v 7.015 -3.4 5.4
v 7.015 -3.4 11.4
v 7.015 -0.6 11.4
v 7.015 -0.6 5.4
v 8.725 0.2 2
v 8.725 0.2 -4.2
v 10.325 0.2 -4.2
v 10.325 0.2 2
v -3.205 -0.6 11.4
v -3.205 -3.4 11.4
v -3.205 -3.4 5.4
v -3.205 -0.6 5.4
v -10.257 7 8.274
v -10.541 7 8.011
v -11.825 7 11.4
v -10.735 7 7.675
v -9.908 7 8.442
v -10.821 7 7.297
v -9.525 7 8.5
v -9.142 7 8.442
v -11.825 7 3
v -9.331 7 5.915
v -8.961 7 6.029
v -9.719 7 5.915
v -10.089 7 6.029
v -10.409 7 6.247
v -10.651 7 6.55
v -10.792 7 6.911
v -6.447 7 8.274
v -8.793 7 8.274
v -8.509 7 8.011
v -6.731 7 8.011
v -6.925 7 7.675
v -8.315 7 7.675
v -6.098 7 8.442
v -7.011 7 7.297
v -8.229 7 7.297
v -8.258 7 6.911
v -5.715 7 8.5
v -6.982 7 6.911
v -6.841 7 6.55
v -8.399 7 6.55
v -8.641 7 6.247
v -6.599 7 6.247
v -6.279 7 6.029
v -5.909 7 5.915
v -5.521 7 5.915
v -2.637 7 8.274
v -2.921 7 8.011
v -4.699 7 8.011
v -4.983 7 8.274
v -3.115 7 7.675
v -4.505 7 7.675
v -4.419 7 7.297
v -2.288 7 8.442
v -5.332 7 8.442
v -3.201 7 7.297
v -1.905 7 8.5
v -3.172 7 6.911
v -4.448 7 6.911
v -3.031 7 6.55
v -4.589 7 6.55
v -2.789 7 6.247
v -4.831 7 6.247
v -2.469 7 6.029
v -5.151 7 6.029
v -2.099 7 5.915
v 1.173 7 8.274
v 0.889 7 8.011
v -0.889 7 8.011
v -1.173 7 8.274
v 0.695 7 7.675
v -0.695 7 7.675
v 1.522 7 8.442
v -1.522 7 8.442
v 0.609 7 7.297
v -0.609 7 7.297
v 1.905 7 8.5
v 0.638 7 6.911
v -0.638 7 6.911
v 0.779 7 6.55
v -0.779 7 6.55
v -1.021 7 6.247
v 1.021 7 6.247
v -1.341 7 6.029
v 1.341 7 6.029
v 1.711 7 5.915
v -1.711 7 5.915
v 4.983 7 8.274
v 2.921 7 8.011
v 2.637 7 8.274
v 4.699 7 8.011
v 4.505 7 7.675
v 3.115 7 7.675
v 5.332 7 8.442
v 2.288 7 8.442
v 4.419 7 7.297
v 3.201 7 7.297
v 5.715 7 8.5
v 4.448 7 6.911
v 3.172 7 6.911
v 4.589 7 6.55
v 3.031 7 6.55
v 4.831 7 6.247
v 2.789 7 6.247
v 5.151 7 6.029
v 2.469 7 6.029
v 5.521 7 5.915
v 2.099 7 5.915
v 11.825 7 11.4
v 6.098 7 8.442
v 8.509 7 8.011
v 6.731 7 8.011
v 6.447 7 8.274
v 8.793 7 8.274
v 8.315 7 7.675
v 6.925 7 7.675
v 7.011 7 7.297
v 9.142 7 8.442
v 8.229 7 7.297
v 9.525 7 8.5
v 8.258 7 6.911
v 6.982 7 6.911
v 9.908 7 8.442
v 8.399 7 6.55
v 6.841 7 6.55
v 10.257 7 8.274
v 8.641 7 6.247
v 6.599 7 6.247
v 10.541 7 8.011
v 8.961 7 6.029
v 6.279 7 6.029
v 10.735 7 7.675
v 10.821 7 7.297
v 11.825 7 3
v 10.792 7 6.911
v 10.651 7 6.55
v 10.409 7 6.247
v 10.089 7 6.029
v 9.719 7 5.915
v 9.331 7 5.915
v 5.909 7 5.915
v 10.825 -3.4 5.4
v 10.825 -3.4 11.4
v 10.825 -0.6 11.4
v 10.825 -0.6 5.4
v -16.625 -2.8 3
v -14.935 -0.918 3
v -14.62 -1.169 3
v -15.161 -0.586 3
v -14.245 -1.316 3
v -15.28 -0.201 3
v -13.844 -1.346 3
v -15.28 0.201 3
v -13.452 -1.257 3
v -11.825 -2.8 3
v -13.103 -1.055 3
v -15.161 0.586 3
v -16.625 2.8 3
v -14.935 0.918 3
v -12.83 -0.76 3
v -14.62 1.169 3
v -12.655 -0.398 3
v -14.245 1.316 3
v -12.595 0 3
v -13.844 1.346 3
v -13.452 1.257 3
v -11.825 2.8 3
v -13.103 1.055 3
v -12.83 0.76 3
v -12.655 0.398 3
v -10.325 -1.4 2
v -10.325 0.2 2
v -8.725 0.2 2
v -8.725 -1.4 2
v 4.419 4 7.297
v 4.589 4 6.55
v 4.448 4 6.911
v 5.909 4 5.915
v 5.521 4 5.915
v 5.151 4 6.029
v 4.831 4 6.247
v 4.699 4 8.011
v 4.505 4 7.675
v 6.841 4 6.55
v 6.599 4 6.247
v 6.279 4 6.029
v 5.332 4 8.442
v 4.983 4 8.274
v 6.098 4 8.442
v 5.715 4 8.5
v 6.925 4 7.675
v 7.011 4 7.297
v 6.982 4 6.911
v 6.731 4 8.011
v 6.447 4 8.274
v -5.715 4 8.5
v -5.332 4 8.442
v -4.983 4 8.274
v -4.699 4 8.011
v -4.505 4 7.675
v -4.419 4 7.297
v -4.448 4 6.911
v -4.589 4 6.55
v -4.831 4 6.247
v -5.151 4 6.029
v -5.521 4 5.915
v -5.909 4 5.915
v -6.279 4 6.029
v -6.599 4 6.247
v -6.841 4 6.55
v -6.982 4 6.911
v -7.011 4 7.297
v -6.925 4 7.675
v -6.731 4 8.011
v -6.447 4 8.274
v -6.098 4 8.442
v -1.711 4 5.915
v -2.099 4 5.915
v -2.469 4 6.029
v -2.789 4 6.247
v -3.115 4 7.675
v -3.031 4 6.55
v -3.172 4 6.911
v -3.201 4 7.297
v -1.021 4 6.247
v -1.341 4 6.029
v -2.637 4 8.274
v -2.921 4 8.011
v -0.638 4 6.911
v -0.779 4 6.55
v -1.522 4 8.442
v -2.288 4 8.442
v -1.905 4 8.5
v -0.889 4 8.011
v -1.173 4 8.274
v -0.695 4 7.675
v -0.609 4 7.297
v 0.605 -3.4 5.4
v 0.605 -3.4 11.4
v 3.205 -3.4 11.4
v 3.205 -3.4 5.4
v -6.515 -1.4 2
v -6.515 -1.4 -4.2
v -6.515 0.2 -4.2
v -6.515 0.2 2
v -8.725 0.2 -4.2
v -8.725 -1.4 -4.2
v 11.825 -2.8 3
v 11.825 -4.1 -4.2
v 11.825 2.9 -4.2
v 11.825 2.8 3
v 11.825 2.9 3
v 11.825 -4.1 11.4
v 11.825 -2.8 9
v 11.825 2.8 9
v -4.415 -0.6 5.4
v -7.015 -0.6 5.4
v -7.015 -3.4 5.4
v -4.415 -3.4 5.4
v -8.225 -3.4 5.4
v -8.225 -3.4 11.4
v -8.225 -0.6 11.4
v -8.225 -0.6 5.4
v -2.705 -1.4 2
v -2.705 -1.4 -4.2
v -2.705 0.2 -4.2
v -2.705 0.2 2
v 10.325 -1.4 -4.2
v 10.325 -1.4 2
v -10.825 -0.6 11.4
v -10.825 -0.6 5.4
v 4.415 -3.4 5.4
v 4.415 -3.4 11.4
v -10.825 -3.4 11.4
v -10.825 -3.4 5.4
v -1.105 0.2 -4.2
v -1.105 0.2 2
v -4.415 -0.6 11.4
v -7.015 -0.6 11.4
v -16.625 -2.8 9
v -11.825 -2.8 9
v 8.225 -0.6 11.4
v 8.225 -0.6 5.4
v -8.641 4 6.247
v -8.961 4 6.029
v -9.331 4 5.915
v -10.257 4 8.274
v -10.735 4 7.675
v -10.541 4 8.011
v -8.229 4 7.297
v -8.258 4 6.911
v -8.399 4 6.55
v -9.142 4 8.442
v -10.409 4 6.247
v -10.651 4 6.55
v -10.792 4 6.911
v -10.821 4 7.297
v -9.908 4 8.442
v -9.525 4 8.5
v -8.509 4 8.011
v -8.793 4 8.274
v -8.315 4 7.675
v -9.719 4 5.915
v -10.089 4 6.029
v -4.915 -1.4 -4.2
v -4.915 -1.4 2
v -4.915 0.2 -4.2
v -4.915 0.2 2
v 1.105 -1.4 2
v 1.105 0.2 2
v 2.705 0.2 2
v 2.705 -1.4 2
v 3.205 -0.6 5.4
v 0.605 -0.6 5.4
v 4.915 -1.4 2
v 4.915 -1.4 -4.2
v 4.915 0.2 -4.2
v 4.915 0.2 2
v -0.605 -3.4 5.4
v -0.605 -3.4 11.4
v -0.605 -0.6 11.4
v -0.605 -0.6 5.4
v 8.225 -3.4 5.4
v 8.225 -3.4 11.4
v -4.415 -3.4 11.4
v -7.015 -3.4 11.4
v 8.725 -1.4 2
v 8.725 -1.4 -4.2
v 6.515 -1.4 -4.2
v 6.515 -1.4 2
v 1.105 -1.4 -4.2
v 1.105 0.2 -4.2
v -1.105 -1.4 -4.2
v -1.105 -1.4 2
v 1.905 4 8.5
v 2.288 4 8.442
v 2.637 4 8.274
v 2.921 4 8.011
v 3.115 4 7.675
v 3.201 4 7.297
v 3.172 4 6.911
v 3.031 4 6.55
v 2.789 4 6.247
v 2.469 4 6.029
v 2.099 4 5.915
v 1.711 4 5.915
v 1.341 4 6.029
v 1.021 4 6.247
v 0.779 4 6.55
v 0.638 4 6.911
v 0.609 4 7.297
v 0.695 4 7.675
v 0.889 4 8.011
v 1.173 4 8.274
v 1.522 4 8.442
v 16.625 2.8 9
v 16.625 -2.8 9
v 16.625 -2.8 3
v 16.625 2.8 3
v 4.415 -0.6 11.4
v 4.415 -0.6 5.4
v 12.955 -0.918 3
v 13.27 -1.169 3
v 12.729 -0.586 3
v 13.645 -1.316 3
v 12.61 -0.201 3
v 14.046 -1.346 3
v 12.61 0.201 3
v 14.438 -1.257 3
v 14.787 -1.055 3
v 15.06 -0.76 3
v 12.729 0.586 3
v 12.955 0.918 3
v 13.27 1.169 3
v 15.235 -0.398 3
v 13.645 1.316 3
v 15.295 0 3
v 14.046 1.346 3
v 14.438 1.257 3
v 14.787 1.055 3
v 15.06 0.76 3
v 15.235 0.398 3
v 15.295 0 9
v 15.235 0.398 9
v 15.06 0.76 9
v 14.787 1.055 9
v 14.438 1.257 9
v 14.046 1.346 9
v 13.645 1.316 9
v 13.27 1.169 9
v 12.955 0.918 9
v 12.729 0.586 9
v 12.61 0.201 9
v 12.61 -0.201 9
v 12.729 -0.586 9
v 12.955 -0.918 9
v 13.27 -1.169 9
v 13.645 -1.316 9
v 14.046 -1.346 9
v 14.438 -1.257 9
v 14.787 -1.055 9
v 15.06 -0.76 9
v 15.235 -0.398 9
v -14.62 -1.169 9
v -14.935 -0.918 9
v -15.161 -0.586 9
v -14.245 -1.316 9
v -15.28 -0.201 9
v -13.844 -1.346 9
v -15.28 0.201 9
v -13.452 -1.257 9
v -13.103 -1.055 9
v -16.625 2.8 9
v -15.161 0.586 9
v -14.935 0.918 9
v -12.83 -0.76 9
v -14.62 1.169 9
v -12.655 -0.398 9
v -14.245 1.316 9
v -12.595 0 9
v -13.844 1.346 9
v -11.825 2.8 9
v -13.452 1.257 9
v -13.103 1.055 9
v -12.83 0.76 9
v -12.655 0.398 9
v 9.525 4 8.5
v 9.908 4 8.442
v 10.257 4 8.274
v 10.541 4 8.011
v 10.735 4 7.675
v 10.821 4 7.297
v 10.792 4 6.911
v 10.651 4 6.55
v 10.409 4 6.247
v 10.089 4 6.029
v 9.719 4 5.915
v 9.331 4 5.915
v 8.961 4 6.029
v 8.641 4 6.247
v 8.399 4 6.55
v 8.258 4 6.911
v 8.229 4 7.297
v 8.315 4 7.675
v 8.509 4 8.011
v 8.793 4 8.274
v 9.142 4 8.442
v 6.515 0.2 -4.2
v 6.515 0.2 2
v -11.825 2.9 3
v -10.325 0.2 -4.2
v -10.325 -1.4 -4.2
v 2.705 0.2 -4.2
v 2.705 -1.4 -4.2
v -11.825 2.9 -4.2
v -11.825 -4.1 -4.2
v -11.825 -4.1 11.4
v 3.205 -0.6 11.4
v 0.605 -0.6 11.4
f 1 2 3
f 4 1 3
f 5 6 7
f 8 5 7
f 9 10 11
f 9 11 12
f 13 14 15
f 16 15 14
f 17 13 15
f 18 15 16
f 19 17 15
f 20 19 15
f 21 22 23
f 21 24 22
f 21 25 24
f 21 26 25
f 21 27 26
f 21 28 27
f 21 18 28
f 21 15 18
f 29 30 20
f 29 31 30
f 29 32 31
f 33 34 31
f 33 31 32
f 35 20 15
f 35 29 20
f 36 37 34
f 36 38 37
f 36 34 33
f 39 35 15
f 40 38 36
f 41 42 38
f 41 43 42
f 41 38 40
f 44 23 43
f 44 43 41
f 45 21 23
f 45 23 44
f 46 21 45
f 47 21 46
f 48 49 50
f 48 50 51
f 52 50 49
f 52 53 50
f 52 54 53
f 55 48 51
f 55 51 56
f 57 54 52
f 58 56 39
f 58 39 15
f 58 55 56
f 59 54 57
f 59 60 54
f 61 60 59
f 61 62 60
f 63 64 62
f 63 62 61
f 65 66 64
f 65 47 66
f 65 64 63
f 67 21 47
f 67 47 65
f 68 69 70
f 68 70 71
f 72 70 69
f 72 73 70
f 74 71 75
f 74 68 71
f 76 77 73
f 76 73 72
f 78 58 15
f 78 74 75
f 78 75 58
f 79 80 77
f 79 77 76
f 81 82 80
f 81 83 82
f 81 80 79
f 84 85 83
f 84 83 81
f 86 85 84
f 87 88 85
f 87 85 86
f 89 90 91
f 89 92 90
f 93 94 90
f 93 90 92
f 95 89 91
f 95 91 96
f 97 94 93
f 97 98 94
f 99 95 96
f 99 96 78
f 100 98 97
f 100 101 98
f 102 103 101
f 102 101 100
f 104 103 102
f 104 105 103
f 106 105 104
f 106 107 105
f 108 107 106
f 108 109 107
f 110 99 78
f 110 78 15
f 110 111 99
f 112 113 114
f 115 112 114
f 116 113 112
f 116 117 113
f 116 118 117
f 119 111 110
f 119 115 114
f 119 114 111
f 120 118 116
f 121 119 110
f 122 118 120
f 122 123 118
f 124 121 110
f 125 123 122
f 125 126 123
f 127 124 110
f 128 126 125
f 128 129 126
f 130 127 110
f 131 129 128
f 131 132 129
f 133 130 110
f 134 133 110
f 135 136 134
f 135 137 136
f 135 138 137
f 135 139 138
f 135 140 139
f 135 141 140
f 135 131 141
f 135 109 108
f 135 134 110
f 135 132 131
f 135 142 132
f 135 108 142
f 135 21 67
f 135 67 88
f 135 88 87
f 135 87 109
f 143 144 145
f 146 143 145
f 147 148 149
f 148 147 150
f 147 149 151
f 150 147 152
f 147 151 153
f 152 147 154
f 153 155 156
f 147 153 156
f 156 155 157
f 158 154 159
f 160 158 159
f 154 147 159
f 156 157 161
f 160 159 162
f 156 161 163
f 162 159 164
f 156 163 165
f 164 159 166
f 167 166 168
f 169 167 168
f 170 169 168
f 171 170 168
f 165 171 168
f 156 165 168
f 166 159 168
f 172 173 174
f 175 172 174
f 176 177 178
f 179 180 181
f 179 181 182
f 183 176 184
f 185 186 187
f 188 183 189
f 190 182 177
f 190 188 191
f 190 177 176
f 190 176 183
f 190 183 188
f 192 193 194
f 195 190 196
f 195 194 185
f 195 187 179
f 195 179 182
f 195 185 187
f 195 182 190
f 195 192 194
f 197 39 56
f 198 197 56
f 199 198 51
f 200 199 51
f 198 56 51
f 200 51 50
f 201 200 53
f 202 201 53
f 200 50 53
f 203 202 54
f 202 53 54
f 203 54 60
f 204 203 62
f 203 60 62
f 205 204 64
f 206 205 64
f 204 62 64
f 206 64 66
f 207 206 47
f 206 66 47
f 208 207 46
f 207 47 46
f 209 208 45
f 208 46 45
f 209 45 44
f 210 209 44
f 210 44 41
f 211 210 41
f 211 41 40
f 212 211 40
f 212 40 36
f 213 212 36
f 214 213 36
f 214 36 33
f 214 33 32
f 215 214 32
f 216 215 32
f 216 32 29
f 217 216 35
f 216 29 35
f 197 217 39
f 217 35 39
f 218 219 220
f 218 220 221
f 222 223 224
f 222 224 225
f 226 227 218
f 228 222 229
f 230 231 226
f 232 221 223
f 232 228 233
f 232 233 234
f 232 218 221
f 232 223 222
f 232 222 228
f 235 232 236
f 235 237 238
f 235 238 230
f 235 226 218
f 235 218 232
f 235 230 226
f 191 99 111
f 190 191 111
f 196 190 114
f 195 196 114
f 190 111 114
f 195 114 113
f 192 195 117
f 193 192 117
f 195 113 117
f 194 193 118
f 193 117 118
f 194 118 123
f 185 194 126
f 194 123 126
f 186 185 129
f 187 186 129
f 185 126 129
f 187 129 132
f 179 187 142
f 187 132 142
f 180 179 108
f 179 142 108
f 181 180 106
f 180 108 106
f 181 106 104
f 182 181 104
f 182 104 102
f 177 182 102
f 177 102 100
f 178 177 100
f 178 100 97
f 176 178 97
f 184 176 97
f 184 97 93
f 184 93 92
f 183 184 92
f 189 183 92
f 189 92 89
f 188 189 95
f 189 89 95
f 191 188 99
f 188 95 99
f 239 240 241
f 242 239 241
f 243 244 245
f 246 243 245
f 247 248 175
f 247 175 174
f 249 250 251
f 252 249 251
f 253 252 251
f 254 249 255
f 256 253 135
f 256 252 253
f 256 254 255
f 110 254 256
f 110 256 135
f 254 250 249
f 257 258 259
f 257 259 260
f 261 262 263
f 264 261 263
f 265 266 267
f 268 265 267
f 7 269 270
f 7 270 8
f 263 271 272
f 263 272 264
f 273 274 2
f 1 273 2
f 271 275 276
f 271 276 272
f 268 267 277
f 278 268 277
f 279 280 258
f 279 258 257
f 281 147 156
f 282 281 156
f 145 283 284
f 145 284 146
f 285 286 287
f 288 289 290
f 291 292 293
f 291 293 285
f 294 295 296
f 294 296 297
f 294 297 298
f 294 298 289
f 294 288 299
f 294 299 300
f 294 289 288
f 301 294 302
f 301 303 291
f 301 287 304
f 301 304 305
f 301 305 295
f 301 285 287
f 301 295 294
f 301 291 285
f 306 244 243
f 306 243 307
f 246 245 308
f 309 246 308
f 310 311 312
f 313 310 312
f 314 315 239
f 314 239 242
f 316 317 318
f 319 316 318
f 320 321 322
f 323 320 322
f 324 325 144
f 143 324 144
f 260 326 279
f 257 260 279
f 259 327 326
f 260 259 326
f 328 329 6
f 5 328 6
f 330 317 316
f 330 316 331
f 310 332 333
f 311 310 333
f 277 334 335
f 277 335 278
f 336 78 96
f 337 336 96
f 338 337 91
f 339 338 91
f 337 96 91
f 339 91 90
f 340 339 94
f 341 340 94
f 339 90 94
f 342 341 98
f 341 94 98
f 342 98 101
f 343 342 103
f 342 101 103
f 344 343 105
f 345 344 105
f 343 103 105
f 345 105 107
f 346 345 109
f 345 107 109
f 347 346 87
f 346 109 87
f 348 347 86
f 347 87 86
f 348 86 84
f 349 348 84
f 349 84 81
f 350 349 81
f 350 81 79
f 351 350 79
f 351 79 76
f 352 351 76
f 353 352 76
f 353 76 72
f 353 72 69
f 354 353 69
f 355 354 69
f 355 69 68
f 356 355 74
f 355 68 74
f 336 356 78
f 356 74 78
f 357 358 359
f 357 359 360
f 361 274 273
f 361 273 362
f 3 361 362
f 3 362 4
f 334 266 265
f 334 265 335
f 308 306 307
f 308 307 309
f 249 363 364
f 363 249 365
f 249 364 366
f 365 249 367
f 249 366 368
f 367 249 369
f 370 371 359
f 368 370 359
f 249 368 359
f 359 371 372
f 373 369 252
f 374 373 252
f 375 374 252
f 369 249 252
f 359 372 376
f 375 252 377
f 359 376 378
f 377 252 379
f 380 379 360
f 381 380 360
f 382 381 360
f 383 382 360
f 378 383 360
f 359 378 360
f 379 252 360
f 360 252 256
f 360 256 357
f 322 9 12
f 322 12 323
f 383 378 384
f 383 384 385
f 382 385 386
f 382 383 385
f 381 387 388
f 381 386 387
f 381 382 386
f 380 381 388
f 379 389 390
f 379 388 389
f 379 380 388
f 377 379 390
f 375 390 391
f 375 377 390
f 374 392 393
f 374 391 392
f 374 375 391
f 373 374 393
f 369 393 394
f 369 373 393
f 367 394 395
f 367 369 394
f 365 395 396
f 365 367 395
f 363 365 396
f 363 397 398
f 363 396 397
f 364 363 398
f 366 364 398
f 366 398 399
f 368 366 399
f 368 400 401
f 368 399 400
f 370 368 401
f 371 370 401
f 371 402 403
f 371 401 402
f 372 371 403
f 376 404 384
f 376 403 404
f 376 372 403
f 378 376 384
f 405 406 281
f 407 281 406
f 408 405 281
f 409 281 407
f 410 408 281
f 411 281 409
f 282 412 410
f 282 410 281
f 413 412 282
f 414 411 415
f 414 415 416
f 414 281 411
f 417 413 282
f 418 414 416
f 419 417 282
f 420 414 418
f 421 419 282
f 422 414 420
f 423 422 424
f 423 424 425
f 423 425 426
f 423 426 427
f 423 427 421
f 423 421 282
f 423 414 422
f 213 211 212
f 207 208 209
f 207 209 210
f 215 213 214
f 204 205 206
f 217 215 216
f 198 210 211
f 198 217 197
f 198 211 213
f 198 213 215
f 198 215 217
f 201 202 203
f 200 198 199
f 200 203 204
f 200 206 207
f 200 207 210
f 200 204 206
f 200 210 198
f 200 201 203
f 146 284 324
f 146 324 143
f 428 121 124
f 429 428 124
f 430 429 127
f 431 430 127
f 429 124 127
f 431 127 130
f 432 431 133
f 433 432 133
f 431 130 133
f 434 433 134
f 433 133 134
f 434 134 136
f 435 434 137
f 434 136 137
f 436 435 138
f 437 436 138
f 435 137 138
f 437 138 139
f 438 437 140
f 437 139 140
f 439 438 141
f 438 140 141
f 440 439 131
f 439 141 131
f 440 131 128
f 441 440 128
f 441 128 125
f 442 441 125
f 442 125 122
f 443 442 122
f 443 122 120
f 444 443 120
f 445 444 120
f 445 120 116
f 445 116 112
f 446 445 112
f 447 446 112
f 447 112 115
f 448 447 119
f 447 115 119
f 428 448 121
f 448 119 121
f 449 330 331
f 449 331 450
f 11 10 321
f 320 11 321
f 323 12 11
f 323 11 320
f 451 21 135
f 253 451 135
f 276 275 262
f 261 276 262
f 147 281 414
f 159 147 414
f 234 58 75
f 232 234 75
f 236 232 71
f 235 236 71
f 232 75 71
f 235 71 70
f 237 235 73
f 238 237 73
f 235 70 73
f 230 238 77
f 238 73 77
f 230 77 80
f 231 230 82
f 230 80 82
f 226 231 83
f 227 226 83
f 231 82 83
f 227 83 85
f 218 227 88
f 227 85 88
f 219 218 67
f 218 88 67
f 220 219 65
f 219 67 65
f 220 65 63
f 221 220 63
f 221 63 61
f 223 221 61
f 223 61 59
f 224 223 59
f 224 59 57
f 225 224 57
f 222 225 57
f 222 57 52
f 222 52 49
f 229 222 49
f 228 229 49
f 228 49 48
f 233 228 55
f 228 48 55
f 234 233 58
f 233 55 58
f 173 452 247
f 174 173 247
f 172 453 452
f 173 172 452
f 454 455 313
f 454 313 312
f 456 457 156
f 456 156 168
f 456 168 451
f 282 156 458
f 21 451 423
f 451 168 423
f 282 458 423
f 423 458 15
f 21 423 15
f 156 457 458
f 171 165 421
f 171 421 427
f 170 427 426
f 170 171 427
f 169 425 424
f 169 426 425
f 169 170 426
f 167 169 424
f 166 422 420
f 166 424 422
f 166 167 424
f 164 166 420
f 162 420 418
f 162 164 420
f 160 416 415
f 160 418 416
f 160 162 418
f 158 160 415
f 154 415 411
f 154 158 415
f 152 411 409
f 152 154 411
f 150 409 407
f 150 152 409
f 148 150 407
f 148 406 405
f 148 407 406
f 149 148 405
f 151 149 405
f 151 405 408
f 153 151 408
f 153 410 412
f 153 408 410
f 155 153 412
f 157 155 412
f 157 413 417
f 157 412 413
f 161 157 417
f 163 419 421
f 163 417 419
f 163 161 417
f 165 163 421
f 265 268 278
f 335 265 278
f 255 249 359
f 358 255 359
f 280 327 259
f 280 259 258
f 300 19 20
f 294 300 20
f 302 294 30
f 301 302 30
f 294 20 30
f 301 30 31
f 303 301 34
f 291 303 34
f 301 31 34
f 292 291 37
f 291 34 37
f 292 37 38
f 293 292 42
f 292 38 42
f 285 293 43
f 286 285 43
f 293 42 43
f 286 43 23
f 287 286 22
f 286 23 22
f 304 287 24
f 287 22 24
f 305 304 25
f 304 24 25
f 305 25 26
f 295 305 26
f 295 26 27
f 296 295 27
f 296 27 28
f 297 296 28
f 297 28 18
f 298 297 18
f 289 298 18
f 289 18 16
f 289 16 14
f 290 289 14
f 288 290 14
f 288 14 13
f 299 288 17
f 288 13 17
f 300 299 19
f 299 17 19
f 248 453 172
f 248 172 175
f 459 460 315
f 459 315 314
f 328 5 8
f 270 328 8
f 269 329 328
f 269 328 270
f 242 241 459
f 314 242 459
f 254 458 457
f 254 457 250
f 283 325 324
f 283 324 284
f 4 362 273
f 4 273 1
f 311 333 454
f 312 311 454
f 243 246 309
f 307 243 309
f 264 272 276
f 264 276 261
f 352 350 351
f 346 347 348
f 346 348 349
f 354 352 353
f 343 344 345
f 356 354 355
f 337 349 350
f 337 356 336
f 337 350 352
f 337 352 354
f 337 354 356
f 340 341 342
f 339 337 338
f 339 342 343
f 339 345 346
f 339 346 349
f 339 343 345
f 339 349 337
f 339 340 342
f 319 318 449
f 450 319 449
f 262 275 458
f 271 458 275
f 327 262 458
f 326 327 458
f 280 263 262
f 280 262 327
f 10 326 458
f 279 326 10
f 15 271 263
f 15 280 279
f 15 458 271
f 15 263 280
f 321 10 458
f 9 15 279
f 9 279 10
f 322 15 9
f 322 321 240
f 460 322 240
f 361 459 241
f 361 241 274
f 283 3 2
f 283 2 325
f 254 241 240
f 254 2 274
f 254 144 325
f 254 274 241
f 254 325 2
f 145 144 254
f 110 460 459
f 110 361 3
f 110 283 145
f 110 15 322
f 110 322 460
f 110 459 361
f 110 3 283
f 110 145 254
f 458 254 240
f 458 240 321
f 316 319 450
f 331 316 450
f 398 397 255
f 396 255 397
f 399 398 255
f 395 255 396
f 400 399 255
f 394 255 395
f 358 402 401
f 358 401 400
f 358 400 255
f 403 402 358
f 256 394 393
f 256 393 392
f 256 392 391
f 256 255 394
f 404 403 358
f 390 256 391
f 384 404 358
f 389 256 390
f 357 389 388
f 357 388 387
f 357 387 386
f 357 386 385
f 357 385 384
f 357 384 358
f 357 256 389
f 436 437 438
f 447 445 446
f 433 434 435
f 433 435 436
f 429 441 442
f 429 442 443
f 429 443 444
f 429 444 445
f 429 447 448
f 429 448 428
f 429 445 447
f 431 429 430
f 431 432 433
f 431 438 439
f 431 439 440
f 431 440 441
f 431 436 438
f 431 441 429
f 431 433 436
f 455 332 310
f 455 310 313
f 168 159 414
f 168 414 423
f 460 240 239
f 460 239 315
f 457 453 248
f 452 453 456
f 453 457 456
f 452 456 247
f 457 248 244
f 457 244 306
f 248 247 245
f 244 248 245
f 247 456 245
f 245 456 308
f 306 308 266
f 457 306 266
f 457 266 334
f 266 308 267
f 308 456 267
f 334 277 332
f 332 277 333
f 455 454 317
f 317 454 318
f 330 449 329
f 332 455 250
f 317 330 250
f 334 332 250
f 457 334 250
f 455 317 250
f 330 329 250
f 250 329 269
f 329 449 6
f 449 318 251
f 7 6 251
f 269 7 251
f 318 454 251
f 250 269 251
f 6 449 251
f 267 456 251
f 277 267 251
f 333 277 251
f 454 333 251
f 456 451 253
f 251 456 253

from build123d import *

# Parameters (mm, degrees)
SK_BODY_W                     = 23.65
SK_BODY_H                     = 11.1
BODY_DEPTH                    = 8.4
SK_FLANGE_EARS_W              = 4.8
SK_FLANGE_EARS_H              = 5.6
FLANGE_EARS_DEPTH             = 6
SK_NOSE_W                     = 23.65
SK_NOSE_H                     = 7
NOSE_DEPTH                    = 7.2
FLANGE_SCREW_HOLES_DEPTH      = 22.338946202
FLANGE_SCREW_HOLES_DEPTH_BACK = 22.338946202
SK_FLANGE_SCREW_HOLES_R       = 1.35
SK_WIRE_ENTRIES_W             = 2.6
SK_WIRE_ENTRIES_H             = 2.8
WIRE_ENTRIES_DEPTH            = 6
SK_CONTACT_OPENINGS_W         = 1.6
SK_CONTACT_OPENINGS_H         = 1.6
CONTACT_OPENINGS_DEPTH        = 6.2
SK_CLAMP_SCREW_HOLES_R        = 1.3
CLAMP_SCREW_HOLES_DEPTH       = 3


with BuildPart() as part:
    # SK Body → Body (new body)
    with BuildSketch(Plane.XY.offset(3)):
        with Locations((0, 1.45)):
            Rectangle(SK_BODY_W, SK_BODY_H)
    extrude(amount=BODY_DEPTH)

    # SK Flange ears → Flange ears (add)
    with BuildSketch(Plane.XY.offset(3)):
        with Locations((14.225, 0)):
            Rectangle(SK_FLANGE_EARS_W, SK_FLANGE_EARS_H)
        with Locations((-14.225, 0)):
            Rectangle(SK_FLANGE_EARS_W, SK_FLANGE_EARS_H)
    extrude(amount=FLANGE_EARS_DEPTH)

    # SK Nose → Nose (add)
    with BuildSketch(Plane.XY.offset(3)):
        with Locations((0, -0.6)):
            Rectangle(SK_NOSE_W, SK_NOSE_H)
    extrude(amount=-NOSE_DEPTH)

    # SK Flange screw holes → Flange screw holes (cut, two sides: drawn at the far end of the back side and taken through both)
    with BuildSketch(Plane.XY.offset(-FLANGE_SCREW_HOLES_DEPTH_BACK)):
        with Locations((-13.945, 0)):
            Circle(SK_FLANGE_SCREW_HOLES_R)
        with Locations((13.945, 0)):
            Circle(SK_FLANGE_SCREW_HOLES_R)
    extrude(amount=FLANGE_SCREW_HOLES_DEPTH + FLANGE_SCREW_HOLES_DEPTH_BACK, mode=Mode.SUBTRACT)

    # SK Wire entries → Wire entries (cut)
    with BuildSketch(Plane.XY.offset(11.4)):
        with Locations((-9.525, -2)):
            Rectangle(SK_WIRE_ENTRIES_W, SK_WIRE_ENTRIES_H)
        with Locations((-5.715, -2)):
            Rectangle(SK_WIRE_ENTRIES_W, SK_WIRE_ENTRIES_H)
        with Locations((-1.905, -2)):
            Rectangle(SK_WIRE_ENTRIES_W, SK_WIRE_ENTRIES_H)
        with Locations((1.905, -2)):
            Rectangle(SK_WIRE_ENTRIES_W, SK_WIRE_ENTRIES_H)
        with Locations((5.715, -2)):
            Rectangle(SK_WIRE_ENTRIES_W, SK_WIRE_ENTRIES_H)
        with Locations((9.525, -2)):
            Rectangle(SK_WIRE_ENTRIES_W, SK_WIRE_ENTRIES_H)
    extrude(amount=-WIRE_ENTRIES_DEPTH, mode=Mode.SUBTRACT)

    # SK Contact openings → Contact openings (cut)
    with BuildSketch(Plane.XY.offset(-4.2)):
        with Locations((-9.525, -0.6)):
            Rectangle(SK_CONTACT_OPENINGS_W, SK_CONTACT_OPENINGS_H)
        with Locations((-5.715, -0.6)):
            Rectangle(SK_CONTACT_OPENINGS_W, SK_CONTACT_OPENINGS_H)
        with Locations((-1.905, -0.6)):
            Rectangle(SK_CONTACT_OPENINGS_W, SK_CONTACT_OPENINGS_H)
        with Locations((1.905, -0.6)):
            Rectangle(SK_CONTACT_OPENINGS_W, SK_CONTACT_OPENINGS_H)
        with Locations((5.715, -0.6)):
            Rectangle(SK_CONTACT_OPENINGS_W, SK_CONTACT_OPENINGS_H)
        with Locations((9.525, -0.6)):
            Rectangle(SK_CONTACT_OPENINGS_W, SK_CONTACT_OPENINGS_H)
    extrude(amount=CONTACT_OPENINGS_DEPTH, mode=Mode.SUBTRACT)

    # SK Clamp screw holes → Clamp screw holes (cut)
    with BuildSketch(Plane(origin=(0, 7, 0), x_dir=(1, 0, 0), z_dir=(0, 1, 0))):
        with Locations(Location((-9.525, -7.2, 0), (0, 0, 270))):
            Circle(SK_CLAMP_SCREW_HOLES_R)
        with Locations(Location((-5.715, -7.2, 0), (0, 0, 270))):
            Circle(SK_CLAMP_SCREW_HOLES_R)
        with Locations(Location((-1.905, -7.2, 0), (0, 0, 270))):
            Circle(SK_CLAMP_SCREW_HOLES_R)
        with Locations(Location((1.905, -7.2, 0), (0, 0, 270))):
            Circle(SK_CLAMP_SCREW_HOLES_R)
        with Locations(Location((5.715, -7.2, 0), (0, 0, 270))):
            Circle(SK_CLAMP_SCREW_HOLES_R)
        with Locations(Location((9.525, -7.2, 0), (0, 0, 270))):
            Circle(SK_CLAMP_SCREW_HOLES_R)
    extrude(amount=-CLAMP_SCREW_HOLES_DEPTH, mode=Mode.SUBTRACT)


solid = part.part
